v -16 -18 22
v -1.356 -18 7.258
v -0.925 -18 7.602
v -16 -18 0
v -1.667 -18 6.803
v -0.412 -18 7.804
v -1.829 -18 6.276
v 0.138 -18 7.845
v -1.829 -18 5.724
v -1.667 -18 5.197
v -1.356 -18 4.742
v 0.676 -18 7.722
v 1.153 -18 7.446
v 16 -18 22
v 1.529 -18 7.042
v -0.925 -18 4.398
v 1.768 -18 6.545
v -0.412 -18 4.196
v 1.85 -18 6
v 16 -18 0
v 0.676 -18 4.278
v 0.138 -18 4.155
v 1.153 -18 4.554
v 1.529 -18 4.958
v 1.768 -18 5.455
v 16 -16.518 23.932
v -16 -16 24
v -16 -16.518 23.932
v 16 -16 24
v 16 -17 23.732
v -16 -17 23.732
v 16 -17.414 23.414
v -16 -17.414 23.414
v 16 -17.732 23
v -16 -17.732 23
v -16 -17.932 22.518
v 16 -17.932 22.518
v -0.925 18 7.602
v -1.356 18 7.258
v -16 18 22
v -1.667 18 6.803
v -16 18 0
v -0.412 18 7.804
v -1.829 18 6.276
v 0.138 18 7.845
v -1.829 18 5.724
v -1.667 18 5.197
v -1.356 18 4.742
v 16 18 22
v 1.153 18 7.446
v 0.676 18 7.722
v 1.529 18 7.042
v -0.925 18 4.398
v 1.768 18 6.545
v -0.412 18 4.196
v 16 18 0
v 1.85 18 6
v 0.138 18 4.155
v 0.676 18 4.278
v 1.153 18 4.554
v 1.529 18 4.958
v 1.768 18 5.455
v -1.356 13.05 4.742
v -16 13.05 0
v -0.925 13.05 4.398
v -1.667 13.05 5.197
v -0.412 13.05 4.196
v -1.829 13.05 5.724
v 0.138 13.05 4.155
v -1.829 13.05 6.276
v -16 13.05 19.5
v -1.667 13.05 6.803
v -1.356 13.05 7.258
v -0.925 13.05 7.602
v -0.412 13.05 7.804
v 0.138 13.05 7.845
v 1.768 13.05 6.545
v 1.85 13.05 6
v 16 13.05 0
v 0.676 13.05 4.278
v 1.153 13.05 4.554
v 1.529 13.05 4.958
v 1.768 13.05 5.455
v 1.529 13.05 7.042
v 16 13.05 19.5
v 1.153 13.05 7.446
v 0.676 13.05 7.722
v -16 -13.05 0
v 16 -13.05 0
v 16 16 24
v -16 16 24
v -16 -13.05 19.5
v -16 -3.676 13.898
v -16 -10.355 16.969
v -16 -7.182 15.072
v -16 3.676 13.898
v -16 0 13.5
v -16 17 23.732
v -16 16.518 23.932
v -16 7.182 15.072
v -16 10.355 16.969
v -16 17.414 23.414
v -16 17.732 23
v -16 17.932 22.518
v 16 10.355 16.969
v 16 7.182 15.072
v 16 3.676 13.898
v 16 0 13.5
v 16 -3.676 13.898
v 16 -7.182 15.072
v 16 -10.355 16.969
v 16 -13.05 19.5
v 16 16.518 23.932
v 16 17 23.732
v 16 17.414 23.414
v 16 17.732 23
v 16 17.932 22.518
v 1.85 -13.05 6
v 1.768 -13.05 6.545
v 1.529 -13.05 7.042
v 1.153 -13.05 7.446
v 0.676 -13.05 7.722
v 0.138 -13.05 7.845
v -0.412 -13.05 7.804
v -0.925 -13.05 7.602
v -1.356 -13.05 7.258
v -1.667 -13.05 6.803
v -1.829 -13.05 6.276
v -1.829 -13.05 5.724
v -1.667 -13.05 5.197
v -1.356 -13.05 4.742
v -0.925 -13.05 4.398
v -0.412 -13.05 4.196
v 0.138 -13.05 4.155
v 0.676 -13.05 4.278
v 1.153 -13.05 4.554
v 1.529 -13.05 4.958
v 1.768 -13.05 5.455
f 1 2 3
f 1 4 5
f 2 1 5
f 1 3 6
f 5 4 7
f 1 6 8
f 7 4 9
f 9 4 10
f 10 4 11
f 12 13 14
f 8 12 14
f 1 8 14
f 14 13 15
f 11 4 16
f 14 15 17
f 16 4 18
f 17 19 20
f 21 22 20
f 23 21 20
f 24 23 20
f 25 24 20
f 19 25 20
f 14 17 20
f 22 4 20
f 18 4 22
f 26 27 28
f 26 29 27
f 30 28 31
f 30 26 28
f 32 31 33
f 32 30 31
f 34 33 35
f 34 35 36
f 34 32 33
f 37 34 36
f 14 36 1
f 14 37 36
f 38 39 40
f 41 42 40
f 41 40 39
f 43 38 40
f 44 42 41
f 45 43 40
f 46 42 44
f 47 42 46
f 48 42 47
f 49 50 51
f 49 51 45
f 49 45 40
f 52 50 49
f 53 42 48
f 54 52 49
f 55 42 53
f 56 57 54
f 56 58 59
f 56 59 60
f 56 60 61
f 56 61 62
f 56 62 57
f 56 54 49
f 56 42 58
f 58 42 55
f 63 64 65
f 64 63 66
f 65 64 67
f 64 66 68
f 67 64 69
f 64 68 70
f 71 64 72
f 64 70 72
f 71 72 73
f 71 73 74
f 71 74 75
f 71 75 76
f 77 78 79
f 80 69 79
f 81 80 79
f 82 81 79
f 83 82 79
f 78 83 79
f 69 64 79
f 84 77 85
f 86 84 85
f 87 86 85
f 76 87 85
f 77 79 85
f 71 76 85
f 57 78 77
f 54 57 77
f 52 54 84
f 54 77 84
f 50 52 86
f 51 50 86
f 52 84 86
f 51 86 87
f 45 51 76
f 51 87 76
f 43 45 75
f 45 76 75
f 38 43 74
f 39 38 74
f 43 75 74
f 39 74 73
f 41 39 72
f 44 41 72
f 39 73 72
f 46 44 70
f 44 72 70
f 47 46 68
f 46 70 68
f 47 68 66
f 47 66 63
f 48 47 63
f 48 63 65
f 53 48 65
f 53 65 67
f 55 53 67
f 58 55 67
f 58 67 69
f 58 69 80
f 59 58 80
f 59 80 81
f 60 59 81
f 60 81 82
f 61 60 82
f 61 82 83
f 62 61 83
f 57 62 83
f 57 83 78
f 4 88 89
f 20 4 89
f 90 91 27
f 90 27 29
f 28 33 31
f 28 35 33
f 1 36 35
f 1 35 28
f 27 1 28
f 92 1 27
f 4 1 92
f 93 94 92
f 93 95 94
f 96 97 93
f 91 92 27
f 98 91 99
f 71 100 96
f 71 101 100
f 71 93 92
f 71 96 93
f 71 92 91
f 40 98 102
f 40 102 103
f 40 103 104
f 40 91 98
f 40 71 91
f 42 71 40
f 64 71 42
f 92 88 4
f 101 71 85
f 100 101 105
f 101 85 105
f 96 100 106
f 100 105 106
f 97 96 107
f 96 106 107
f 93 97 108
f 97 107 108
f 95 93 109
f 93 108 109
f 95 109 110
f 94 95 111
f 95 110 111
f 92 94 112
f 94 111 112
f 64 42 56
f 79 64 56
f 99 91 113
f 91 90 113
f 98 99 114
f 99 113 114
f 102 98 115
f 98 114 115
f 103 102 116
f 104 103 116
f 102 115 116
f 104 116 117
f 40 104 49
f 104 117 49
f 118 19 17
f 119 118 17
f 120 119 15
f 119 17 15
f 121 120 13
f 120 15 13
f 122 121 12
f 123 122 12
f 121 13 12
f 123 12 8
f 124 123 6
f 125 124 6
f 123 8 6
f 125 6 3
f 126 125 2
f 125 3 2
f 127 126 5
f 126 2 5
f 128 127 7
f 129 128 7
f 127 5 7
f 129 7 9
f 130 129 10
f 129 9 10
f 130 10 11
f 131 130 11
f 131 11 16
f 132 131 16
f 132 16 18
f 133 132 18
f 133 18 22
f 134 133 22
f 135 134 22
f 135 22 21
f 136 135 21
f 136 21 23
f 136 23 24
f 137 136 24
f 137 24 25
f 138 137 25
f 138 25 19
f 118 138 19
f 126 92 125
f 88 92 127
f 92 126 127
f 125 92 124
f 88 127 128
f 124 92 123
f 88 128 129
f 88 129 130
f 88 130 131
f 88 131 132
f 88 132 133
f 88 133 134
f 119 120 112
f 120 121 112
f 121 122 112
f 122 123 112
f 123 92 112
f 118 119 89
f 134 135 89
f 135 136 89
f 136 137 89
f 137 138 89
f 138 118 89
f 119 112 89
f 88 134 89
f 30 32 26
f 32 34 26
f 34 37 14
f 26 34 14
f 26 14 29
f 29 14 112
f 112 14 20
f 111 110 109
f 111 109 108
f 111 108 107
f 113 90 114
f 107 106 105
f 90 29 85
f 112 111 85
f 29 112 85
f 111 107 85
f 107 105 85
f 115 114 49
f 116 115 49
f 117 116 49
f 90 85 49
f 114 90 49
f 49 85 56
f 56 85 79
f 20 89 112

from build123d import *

# Parameters (mm, degrees)
F0_W     = 32
F0_H     = 36
F1_DEPTH = 24
F3_DEPTH = 89
F4_R     = 2
F5_R     = 2
F6_R     = 1.85
F7_DEPTH = 90


# Not quite as in the source:
# - a feature names something its author has since deleted; it is built from what else it names


with BuildPart() as f1:
    # F0 (on Top) → F1 (new body)
    with BuildSketch(Plane.XY):
        Rectangle(F0_W, F0_H)
    extrude(amount=F1_DEPTH)

    # F2 (on face) → F3 (cut)
    with BuildSketch(Plane.YZ.offset(16)):
        with BuildLine():
            ThreePointArc((13.05, 19.5), (0, 13.5), (-13.05, 19.5))
            Line((-13.05, 19.5), (-13.05, 0))
            Line((-13.05, 0), (13.05, 0))
            Line((13.05, 0), (13.05, 19.5))
        make_face()
    extrude(amount=-F3_DEPTH, mode=Mode.SUBTRACT)

    # F4
    f4_edges = [f1.edges().sort_by_distance(p)[0] for p in [
        (0, -18, 24),
    ]]
    fillet(f4_edges, radius=F4_R)

    # F5
    f5_edges = [f1.edges().sort_by_distance(p)[0] for p in [
        (0, 18, 24),
    ]]
    fillet(f5_edges, radius=F5_R)

    # F6 (on face) → F7 (cut)
    with BuildSketch(Plane.XZ.offset(18)):
        with Locations((-24, 6)):
            Circle(F6_R)
        with Locations((0, 6)):
            Circle(F6_R)
        with Locations((24, 6)):
            Circle(F6_R)
    extrude(amount=-F7_DEPTH, mode=Mode.SUBTRACT)


solid = f1.part
